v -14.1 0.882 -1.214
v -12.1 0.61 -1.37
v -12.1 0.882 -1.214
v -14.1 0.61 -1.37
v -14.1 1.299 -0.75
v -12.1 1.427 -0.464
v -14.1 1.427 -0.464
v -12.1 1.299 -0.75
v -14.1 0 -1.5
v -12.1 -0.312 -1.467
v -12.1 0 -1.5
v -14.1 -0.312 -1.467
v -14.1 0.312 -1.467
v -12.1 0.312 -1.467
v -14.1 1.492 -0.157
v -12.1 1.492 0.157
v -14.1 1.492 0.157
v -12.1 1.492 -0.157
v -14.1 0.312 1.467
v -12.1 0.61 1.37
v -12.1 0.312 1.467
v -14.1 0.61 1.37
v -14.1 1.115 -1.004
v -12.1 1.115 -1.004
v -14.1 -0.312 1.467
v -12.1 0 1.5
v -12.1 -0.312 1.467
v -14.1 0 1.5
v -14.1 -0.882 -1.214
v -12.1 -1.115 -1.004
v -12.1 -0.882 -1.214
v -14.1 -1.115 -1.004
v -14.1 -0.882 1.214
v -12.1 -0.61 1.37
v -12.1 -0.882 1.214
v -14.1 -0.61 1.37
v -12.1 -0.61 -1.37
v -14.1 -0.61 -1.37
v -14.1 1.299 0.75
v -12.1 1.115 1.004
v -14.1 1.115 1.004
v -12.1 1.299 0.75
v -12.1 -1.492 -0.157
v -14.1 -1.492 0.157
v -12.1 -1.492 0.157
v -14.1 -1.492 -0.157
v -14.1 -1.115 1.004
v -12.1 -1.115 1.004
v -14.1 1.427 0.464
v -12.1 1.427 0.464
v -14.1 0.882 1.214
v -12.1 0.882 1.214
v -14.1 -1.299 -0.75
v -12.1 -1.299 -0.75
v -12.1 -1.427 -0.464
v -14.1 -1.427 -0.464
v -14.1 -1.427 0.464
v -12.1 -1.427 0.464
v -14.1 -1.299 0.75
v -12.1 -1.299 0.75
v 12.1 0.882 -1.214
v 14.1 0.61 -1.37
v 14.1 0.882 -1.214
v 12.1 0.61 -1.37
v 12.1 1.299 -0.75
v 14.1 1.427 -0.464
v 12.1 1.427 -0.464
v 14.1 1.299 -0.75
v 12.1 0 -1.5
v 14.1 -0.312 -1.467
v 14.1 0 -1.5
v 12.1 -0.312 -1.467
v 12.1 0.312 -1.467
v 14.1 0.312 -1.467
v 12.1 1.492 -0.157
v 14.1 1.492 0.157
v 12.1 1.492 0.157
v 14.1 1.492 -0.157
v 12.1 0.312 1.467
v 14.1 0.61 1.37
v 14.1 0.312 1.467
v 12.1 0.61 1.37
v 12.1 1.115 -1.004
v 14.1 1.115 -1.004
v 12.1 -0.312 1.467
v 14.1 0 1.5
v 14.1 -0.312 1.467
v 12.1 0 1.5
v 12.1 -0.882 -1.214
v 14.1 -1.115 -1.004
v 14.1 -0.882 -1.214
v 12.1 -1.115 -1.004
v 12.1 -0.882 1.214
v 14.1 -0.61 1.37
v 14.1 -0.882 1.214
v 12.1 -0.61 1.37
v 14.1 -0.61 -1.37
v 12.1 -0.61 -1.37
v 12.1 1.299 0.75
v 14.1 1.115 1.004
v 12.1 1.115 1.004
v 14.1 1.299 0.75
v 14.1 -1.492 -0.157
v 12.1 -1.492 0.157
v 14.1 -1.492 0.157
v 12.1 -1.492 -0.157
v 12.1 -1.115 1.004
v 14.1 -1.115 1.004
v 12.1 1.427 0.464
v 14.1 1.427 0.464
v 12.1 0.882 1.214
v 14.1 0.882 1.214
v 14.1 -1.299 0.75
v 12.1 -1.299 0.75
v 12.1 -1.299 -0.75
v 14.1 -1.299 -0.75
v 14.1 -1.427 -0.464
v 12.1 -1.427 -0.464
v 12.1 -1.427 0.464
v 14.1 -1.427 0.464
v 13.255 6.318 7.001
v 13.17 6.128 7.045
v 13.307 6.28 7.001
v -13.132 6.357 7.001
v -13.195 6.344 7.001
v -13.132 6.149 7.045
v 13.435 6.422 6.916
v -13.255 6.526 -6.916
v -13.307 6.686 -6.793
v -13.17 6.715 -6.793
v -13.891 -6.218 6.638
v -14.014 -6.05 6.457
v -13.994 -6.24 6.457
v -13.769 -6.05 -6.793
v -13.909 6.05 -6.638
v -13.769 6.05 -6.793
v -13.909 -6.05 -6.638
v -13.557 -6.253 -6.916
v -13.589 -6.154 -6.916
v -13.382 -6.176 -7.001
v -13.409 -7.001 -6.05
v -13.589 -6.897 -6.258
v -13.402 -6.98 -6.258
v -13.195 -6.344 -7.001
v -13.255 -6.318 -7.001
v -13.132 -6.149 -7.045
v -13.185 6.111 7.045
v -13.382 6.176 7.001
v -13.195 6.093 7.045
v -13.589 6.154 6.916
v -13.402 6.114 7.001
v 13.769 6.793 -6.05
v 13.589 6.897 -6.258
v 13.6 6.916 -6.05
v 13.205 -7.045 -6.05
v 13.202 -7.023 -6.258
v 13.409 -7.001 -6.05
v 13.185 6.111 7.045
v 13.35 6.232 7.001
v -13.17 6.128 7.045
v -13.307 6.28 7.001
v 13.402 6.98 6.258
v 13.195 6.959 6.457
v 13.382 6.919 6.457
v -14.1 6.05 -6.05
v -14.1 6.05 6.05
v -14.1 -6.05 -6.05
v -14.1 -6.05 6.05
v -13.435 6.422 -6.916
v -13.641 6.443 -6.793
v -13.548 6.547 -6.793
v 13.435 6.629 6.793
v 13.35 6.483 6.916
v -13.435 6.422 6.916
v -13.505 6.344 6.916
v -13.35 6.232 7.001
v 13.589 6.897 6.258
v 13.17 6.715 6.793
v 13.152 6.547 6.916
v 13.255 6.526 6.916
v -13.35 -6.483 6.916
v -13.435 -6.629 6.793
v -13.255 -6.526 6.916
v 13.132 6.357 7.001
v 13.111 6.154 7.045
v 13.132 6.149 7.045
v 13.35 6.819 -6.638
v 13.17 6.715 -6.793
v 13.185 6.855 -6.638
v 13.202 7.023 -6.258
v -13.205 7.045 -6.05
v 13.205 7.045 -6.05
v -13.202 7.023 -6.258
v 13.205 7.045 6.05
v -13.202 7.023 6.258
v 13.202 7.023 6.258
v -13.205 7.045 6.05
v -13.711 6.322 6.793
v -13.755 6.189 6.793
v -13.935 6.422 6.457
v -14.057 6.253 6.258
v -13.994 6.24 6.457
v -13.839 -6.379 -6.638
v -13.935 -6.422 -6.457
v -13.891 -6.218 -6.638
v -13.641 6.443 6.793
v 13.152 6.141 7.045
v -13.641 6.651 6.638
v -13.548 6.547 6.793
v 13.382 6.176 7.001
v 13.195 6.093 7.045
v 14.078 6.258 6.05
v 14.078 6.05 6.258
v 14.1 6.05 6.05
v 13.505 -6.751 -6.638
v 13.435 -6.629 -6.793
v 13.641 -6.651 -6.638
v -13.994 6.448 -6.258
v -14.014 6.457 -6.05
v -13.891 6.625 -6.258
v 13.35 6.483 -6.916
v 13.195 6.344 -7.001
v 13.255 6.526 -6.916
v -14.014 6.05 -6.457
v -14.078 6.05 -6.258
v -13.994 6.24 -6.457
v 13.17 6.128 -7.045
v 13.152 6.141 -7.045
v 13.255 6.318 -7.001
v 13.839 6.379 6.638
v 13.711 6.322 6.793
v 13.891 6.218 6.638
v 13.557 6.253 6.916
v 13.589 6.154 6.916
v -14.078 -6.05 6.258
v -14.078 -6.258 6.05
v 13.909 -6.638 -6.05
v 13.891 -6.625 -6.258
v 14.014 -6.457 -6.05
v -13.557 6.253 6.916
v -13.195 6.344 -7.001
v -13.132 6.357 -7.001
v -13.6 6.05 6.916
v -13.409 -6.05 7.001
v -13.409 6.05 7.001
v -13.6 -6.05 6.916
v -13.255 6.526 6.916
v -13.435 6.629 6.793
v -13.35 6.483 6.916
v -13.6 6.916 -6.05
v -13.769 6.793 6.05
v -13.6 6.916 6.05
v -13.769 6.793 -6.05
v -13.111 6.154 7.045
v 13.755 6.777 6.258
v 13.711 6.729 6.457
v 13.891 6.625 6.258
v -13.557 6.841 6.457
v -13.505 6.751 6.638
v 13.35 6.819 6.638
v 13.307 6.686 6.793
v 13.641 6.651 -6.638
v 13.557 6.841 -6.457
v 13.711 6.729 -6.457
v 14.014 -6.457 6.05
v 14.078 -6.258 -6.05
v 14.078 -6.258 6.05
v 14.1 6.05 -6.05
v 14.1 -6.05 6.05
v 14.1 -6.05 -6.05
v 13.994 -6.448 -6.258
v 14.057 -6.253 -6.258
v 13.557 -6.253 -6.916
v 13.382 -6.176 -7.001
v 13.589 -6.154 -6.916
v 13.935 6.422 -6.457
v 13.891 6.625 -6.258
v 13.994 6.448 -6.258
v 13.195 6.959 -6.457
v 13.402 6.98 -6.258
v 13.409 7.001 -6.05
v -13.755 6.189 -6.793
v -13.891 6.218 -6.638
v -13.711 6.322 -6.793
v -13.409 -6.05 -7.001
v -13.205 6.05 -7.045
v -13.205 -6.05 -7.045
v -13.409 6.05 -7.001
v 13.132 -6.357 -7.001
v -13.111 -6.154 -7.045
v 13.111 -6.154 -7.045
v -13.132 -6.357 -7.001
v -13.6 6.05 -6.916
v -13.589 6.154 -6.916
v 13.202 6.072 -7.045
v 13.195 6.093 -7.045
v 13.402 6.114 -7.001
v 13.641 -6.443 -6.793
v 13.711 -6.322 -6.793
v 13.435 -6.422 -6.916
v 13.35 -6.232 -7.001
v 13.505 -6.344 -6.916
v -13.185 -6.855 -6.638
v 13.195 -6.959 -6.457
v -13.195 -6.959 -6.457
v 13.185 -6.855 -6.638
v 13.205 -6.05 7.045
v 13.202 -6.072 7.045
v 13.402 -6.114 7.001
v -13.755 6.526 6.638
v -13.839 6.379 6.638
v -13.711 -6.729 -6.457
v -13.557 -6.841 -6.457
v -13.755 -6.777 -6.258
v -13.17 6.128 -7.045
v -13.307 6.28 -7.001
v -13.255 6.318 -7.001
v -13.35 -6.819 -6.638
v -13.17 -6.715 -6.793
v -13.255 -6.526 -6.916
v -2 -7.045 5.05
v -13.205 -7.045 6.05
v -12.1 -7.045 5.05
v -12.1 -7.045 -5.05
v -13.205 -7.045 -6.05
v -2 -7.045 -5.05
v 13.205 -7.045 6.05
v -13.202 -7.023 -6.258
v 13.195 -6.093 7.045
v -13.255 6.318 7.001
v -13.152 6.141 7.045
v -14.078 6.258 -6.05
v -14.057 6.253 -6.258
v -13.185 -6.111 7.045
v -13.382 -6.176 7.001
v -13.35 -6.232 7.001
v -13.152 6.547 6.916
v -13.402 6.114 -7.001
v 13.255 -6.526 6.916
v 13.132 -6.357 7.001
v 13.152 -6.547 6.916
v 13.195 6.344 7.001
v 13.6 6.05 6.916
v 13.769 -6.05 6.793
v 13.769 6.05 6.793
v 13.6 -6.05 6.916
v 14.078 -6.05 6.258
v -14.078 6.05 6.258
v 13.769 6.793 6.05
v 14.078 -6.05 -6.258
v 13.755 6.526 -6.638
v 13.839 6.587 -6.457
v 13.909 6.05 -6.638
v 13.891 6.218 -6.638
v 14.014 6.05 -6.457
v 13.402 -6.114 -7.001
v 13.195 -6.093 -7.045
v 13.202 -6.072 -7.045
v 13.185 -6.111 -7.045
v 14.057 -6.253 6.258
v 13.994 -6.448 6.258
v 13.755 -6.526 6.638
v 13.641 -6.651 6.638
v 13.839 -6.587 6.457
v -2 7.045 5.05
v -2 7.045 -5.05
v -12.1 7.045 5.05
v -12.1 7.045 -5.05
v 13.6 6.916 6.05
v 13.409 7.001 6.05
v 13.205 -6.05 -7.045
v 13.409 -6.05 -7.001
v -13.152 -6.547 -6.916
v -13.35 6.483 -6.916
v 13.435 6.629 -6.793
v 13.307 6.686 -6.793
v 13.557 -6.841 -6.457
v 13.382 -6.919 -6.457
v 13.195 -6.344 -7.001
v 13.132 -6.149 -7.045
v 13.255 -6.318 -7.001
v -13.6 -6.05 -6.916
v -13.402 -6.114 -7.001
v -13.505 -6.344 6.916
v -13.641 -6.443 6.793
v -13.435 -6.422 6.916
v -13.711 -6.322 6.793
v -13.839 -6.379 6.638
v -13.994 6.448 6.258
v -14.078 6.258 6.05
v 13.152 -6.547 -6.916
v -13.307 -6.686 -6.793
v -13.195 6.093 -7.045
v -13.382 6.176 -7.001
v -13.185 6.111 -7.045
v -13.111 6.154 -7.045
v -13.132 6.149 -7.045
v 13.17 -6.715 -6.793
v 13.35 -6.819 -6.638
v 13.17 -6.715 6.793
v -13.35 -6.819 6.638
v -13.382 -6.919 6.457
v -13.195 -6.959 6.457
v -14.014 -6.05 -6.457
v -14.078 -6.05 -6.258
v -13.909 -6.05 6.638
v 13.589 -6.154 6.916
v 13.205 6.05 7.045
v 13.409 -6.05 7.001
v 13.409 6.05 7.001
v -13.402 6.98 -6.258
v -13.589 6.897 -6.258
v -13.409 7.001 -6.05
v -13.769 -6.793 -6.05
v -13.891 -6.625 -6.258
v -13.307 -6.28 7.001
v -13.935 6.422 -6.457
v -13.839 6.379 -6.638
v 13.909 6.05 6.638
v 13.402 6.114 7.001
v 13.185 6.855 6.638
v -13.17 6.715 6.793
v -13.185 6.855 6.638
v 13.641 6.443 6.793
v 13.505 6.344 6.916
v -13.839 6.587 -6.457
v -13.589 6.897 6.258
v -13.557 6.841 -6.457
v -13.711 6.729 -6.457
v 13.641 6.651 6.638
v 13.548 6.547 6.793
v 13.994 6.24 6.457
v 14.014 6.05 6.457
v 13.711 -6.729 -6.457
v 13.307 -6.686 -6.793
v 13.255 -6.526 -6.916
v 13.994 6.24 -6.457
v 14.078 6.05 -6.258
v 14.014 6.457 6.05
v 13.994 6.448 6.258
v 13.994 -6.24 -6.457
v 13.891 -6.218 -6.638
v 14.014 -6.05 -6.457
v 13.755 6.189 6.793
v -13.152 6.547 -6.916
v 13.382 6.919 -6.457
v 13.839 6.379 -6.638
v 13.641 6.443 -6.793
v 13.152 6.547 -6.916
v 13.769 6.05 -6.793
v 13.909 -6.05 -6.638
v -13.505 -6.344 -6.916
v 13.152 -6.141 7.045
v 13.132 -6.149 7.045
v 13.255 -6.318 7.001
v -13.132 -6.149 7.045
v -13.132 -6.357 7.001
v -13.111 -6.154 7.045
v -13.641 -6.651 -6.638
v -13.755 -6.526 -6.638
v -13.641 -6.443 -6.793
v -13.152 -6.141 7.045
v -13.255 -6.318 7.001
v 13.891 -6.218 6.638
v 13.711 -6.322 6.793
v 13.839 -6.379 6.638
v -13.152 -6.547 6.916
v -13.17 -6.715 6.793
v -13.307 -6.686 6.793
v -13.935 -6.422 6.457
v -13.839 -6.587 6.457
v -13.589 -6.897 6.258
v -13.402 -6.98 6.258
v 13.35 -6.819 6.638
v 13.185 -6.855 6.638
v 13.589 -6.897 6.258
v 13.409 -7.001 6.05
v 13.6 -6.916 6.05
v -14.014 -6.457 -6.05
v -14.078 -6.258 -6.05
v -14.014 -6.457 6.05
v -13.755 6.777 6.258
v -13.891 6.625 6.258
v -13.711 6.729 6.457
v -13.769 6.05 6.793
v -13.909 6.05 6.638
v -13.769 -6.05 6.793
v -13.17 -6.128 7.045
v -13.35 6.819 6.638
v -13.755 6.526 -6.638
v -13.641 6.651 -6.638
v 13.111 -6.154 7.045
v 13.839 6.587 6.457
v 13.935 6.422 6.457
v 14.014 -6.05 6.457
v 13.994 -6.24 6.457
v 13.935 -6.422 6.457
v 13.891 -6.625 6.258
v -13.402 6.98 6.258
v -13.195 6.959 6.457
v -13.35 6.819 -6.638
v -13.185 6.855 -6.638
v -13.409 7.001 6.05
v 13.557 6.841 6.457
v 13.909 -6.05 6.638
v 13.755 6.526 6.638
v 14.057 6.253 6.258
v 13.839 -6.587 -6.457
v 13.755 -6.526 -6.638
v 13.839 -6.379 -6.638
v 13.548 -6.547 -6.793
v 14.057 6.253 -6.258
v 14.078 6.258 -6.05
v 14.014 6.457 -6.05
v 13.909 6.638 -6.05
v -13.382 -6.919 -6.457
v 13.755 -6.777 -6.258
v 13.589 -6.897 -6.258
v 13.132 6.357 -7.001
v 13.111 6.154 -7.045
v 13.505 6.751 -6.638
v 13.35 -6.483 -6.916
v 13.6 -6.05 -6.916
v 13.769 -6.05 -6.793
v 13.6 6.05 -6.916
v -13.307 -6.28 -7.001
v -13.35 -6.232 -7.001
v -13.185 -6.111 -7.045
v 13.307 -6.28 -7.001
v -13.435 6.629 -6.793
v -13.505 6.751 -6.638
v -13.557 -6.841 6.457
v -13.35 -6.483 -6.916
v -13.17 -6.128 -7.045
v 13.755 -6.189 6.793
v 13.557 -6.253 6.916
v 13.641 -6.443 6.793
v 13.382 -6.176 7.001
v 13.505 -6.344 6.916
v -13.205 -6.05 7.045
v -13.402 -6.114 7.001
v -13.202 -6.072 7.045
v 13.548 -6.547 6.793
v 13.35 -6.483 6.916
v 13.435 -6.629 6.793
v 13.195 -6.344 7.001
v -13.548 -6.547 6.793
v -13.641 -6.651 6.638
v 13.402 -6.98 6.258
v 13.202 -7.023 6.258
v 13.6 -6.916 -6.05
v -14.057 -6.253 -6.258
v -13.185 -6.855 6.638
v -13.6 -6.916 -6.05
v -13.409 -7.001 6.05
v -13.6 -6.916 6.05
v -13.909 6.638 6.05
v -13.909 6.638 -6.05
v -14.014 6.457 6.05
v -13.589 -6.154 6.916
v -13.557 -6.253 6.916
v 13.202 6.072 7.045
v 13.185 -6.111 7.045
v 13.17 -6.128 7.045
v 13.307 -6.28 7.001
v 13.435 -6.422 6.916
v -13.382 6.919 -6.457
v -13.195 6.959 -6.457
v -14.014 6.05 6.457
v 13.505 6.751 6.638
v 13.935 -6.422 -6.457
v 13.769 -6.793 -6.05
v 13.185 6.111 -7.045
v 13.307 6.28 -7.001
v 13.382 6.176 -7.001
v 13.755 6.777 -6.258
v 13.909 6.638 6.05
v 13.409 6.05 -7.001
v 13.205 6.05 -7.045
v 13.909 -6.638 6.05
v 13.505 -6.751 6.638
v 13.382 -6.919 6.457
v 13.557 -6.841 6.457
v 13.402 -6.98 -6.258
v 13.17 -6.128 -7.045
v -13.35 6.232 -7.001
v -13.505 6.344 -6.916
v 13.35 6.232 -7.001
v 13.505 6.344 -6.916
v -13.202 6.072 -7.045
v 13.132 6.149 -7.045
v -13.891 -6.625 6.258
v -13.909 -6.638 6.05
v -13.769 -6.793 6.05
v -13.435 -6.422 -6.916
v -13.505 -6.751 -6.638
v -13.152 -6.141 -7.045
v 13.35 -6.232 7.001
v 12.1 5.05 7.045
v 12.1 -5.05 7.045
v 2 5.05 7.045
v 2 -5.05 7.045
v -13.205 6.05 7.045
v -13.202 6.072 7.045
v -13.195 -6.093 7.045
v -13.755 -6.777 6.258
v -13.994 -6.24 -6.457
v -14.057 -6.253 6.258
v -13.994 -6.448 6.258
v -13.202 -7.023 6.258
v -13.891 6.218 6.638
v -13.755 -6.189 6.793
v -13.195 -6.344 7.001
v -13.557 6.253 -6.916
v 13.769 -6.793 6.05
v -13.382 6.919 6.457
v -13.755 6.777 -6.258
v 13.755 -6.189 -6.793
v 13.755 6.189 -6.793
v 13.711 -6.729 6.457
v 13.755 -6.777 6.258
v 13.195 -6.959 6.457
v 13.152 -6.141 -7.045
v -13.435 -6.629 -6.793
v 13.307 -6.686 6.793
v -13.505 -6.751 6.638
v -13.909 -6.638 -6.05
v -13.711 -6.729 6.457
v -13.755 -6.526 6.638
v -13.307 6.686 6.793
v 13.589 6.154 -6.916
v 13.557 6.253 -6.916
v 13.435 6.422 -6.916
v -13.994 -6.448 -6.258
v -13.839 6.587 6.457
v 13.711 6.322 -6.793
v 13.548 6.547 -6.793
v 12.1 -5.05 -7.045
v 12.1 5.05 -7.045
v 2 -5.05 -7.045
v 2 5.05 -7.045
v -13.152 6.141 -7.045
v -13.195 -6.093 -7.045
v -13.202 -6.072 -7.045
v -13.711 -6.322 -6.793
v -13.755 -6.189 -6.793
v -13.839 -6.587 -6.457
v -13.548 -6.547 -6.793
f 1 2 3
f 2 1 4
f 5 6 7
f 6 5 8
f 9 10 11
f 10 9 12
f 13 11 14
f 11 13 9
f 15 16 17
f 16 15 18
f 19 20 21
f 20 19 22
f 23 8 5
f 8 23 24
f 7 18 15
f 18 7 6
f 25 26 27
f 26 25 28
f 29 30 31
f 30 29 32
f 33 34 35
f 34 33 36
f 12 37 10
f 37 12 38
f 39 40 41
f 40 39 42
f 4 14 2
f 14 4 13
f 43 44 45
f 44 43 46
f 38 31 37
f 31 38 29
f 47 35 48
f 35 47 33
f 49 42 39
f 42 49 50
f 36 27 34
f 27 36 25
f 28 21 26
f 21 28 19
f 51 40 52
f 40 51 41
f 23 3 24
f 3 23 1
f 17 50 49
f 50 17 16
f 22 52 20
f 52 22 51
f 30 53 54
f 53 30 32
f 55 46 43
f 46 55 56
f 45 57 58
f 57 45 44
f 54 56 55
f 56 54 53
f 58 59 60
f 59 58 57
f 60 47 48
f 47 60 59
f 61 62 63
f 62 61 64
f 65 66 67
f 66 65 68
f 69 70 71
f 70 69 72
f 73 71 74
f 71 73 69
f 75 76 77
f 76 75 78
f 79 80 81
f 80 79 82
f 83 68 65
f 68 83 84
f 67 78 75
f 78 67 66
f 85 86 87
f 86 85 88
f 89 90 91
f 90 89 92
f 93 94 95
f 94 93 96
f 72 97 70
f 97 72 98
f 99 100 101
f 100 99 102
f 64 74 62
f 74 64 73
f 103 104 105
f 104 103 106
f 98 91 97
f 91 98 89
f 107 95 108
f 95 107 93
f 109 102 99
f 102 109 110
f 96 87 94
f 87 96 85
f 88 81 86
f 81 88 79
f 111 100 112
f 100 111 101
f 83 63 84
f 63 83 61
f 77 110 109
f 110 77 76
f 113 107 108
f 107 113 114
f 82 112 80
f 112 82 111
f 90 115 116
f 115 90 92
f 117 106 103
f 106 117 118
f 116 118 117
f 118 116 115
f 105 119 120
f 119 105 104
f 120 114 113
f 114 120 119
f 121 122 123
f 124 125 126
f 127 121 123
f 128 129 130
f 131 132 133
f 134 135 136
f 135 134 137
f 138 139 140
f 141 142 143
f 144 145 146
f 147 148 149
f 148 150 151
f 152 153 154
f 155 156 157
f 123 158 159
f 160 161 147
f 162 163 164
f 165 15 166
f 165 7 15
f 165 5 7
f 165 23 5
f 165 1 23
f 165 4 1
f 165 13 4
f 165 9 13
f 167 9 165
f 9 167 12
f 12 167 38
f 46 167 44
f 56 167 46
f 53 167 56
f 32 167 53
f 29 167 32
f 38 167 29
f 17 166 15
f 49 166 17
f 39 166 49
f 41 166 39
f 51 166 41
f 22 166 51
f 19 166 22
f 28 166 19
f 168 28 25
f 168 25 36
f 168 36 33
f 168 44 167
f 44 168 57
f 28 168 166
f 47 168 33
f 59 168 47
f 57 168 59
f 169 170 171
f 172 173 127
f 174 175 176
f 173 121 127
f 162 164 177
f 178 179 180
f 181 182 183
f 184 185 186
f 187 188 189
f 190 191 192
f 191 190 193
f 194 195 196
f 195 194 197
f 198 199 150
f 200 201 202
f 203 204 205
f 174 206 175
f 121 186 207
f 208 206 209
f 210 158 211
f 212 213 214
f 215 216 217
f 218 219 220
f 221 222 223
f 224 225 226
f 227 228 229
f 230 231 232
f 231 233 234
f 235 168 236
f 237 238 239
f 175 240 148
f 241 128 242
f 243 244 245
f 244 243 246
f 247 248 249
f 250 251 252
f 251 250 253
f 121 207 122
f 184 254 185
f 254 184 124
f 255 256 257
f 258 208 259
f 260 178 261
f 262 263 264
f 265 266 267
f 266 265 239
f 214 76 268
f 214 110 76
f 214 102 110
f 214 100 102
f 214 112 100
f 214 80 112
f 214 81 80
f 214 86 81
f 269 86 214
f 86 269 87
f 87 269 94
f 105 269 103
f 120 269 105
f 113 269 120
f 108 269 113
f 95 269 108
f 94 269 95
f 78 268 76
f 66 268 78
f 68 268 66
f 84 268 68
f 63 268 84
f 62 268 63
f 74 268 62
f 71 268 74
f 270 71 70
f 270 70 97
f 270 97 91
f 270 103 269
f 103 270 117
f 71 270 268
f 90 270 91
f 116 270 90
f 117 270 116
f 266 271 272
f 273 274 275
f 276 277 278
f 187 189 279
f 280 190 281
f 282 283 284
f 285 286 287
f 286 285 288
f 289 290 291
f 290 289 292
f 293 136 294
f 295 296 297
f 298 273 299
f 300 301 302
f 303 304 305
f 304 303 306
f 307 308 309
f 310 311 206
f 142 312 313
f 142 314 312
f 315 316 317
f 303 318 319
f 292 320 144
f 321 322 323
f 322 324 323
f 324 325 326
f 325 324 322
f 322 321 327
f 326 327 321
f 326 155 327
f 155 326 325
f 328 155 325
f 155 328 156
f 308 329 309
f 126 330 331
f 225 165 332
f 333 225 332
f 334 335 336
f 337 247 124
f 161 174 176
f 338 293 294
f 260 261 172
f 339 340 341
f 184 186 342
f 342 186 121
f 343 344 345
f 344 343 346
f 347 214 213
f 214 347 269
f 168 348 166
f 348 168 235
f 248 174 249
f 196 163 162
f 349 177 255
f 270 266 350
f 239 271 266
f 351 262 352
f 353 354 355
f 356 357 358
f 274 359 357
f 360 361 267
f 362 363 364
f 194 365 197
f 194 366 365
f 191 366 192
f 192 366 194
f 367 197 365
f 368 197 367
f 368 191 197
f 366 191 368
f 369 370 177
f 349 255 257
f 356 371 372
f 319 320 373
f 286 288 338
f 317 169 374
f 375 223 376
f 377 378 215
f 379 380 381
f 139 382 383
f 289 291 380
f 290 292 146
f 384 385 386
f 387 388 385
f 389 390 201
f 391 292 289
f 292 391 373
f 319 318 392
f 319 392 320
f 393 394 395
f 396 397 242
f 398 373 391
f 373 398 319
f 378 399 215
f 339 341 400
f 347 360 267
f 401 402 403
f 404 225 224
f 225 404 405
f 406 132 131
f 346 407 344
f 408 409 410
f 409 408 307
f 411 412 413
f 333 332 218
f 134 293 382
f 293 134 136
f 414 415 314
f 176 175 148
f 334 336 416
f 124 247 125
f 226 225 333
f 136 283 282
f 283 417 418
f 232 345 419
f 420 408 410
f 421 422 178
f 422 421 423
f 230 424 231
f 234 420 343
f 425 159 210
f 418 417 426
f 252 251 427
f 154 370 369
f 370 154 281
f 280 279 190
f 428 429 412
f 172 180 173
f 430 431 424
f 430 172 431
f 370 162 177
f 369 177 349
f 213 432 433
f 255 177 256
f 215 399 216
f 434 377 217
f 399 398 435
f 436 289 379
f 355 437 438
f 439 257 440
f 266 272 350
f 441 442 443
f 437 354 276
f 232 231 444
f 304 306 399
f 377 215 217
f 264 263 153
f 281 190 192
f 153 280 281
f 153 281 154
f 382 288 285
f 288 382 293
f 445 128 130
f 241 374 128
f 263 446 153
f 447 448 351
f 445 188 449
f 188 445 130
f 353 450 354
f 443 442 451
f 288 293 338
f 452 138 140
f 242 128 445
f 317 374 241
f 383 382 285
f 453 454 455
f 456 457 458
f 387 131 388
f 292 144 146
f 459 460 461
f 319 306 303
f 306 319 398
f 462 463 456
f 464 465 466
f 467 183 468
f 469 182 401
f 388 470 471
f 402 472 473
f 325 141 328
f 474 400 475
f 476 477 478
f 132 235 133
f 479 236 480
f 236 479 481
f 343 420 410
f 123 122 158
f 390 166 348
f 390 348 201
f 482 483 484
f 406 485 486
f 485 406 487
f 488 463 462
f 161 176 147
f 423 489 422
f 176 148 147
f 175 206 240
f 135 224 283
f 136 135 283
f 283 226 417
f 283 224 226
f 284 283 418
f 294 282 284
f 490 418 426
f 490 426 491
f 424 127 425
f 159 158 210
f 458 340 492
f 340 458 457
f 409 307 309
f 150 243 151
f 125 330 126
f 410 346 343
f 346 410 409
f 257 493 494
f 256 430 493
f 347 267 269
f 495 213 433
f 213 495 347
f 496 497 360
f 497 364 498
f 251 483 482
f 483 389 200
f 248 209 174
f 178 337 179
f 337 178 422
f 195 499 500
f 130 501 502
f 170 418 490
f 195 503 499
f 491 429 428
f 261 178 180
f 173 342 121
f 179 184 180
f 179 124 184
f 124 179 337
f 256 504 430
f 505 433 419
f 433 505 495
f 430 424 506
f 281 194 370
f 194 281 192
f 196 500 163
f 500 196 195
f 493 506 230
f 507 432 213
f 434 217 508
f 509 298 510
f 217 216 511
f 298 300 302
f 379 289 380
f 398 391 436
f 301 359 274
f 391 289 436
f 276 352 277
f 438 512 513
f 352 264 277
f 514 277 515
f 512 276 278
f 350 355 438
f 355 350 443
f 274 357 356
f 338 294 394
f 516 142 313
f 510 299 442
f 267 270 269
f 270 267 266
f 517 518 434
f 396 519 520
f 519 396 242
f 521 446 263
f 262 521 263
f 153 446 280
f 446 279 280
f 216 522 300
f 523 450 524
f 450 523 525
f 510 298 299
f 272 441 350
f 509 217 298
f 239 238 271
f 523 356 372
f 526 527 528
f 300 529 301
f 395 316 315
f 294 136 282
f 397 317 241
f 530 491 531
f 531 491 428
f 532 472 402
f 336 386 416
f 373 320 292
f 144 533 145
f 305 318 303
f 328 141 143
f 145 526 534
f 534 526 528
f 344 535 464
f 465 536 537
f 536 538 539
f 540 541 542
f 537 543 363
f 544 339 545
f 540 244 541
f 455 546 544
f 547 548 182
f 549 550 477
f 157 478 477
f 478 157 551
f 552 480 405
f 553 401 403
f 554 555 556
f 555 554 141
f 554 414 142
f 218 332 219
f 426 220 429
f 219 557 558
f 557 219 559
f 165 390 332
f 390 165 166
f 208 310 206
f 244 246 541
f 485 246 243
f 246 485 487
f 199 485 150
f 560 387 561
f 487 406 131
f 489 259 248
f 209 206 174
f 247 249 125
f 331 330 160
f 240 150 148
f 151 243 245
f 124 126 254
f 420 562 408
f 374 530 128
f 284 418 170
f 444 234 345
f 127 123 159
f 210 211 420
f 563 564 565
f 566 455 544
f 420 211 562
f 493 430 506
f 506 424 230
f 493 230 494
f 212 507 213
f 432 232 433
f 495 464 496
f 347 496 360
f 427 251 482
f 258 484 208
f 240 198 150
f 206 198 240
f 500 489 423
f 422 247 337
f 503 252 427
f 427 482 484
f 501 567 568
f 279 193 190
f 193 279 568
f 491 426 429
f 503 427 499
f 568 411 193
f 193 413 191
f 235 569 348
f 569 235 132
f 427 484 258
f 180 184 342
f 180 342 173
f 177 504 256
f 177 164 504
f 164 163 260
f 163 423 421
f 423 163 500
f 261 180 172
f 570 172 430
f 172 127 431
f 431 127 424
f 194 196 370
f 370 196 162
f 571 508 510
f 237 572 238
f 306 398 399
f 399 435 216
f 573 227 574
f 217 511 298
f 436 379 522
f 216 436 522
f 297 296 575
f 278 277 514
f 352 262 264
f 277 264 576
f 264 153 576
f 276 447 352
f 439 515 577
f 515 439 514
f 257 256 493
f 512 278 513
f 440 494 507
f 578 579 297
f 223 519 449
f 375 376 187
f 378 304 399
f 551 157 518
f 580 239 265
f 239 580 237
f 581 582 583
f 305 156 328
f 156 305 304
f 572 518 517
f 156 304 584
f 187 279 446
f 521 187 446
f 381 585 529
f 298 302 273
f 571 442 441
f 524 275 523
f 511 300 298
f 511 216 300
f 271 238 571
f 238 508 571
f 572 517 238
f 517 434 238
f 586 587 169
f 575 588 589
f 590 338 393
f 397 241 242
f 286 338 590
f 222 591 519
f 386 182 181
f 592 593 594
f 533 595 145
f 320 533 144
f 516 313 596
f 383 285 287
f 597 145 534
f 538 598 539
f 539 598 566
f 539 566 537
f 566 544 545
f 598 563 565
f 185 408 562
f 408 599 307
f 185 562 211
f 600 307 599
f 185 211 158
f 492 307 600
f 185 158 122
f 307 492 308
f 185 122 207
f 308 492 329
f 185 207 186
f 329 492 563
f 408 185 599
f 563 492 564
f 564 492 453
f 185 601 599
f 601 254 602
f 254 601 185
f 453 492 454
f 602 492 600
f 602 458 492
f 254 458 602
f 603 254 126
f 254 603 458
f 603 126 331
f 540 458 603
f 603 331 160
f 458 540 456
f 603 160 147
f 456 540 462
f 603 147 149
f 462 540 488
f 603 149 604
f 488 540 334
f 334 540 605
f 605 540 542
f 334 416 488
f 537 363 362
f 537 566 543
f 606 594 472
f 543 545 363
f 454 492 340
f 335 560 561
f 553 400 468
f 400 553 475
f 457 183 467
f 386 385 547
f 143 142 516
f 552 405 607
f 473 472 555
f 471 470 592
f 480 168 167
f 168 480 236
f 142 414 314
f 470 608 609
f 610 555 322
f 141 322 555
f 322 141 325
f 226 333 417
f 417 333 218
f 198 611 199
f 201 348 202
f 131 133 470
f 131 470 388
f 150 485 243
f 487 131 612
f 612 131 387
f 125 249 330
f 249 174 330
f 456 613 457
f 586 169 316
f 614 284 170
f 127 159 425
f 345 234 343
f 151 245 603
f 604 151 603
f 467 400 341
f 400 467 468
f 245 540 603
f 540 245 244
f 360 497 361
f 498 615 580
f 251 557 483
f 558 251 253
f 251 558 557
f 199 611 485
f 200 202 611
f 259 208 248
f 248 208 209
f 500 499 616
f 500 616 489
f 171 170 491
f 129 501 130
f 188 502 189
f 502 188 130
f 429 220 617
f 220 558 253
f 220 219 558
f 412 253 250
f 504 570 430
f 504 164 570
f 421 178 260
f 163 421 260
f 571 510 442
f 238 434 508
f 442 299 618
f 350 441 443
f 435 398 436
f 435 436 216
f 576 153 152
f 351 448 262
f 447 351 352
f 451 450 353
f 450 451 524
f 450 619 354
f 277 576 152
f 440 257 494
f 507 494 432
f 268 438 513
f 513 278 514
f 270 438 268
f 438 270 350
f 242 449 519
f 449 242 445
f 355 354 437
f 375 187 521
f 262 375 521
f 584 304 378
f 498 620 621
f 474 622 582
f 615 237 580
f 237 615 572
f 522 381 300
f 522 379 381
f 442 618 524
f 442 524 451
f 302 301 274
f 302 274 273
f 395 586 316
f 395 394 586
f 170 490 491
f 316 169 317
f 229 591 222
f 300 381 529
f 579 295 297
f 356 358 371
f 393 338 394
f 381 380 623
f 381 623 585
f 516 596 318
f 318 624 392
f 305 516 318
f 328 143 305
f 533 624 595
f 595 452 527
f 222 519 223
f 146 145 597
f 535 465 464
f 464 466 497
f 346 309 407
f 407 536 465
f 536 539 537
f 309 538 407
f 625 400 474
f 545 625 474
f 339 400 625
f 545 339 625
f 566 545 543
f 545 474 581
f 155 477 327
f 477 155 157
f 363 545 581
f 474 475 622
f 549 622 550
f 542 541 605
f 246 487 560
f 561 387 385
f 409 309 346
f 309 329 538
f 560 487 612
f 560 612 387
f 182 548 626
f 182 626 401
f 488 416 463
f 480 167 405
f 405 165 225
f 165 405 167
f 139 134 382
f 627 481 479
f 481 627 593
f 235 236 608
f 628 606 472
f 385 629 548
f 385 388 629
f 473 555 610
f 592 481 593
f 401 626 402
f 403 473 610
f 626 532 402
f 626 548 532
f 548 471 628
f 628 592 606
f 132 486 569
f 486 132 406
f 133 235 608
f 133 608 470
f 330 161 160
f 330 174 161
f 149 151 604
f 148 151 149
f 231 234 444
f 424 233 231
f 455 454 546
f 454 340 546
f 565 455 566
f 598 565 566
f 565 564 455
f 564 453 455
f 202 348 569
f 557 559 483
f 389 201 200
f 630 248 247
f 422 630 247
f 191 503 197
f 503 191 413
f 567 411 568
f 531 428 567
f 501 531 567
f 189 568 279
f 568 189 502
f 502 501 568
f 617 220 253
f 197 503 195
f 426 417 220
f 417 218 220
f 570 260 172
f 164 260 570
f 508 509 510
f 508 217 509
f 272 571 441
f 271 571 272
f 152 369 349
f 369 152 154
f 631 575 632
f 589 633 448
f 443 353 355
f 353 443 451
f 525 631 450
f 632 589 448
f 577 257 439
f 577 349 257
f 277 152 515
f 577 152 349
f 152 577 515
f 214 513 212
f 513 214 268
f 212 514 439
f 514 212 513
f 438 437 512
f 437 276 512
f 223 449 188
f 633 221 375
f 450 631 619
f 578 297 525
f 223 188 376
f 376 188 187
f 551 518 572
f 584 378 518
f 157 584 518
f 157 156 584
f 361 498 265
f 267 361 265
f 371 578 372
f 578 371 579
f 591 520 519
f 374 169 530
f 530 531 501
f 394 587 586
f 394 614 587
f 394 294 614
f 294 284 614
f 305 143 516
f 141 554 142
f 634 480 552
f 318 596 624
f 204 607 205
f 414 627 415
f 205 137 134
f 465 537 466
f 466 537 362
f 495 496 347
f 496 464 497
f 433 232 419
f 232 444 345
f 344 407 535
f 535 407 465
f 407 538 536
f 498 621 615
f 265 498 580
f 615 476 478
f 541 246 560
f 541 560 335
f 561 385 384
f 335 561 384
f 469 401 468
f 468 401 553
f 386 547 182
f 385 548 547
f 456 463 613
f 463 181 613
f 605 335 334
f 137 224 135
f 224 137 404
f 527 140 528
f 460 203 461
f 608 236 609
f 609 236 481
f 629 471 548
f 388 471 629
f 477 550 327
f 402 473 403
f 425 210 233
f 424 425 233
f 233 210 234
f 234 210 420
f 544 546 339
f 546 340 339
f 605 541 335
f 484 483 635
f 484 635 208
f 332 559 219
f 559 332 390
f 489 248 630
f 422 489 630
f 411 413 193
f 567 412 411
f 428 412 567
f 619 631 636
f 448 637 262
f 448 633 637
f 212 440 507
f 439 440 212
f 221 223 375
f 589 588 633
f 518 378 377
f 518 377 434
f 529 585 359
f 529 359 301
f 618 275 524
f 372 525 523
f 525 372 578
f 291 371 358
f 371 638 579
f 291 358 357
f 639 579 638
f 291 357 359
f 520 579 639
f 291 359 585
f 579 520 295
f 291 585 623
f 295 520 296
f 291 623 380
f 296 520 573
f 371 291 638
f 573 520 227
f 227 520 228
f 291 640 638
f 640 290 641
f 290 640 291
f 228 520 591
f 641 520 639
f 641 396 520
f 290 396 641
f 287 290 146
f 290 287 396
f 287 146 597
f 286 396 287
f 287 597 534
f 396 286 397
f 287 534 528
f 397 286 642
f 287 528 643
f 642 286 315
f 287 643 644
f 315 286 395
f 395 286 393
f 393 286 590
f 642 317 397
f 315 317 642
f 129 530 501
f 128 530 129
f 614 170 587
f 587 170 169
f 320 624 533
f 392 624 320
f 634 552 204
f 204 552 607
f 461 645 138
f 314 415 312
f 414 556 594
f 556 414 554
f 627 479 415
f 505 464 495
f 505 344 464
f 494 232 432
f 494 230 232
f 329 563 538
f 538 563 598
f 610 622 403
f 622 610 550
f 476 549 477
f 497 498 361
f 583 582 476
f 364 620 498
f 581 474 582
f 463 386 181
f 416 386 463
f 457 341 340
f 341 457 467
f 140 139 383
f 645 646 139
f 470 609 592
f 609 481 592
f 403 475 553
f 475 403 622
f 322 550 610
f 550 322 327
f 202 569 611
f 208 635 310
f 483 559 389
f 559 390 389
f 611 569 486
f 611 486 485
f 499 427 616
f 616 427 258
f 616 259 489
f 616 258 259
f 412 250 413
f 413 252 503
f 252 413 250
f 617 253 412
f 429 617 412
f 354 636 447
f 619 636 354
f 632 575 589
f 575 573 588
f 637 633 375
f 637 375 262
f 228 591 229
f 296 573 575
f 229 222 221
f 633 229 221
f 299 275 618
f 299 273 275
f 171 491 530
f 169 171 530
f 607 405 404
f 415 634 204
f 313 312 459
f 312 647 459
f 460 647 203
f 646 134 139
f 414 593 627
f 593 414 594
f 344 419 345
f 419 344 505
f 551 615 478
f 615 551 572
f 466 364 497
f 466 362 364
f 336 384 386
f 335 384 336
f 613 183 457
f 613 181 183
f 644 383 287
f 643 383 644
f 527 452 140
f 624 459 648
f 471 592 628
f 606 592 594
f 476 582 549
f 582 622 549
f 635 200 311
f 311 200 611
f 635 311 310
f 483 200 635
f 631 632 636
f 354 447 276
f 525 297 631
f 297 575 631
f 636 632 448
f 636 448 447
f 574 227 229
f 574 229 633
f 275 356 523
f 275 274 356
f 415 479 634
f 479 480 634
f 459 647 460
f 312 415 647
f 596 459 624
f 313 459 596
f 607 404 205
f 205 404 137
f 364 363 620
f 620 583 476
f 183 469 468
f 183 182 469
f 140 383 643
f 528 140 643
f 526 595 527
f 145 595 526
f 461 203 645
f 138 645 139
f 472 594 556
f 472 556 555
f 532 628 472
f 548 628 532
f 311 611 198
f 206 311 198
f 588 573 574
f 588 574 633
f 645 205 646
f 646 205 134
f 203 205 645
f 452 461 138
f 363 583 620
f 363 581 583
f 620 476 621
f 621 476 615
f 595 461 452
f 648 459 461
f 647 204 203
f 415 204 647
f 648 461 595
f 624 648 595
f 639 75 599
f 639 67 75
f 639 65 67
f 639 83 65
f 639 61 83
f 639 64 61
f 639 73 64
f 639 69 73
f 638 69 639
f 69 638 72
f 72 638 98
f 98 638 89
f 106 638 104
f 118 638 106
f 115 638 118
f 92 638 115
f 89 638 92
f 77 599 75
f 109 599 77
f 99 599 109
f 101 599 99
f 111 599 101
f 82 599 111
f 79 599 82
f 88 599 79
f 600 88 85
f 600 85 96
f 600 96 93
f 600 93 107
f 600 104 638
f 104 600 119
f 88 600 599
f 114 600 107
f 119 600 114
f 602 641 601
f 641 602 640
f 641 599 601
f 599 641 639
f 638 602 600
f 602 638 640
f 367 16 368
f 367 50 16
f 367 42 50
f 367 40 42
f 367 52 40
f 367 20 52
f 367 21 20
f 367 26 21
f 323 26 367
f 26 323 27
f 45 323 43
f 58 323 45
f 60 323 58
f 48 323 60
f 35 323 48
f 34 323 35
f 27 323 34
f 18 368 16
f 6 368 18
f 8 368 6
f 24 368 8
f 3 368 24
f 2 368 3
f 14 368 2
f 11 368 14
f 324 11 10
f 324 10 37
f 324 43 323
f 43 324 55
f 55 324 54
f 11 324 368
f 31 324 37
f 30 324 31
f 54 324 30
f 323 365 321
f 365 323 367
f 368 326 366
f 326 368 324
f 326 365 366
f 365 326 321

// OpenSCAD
$fa = 1;
$fs = 0.6;
$fn = 30;

// ==== VARIABLES === //

makerbeam=10.1;
wall=2;
bolt_diameter = 3;


// === GENERATE THE DAMN THING === //
makerbeam_crossmount(
    makerbeam = makerbeam,
    wall = wall,
    bolt_diameter = bolt_diameter
    );


// === MODULES === //

module makerbeam_crossmount(
    makerbeam,
    wall,
    bolt_diameter
    ){
    difference(){
        minkowski(){
            cube([2*makerbeam+3*wall,makerbeam+wall,makerbeam+wall], center=true);
            sphere(r=1);
        }
        translate([wall+makerbeam/2,0,0])
        cube([makerbeam,makerbeam,2*makerbeam], center=true);
        
        translate([-(wall+makerbeam/2),0,0])
        rotate([90,0,0])
        cube([makerbeam,makerbeam,2*makerbeam], center=true);
        
        for (i=[-1,1]){
            translate([i*(makerbeam+2*wall),0,0])
            rotate([0,90,0])
            cylinder(d=bolt_diameter, h=makerbeam+2*wall, center=true);
        }
    }
}
